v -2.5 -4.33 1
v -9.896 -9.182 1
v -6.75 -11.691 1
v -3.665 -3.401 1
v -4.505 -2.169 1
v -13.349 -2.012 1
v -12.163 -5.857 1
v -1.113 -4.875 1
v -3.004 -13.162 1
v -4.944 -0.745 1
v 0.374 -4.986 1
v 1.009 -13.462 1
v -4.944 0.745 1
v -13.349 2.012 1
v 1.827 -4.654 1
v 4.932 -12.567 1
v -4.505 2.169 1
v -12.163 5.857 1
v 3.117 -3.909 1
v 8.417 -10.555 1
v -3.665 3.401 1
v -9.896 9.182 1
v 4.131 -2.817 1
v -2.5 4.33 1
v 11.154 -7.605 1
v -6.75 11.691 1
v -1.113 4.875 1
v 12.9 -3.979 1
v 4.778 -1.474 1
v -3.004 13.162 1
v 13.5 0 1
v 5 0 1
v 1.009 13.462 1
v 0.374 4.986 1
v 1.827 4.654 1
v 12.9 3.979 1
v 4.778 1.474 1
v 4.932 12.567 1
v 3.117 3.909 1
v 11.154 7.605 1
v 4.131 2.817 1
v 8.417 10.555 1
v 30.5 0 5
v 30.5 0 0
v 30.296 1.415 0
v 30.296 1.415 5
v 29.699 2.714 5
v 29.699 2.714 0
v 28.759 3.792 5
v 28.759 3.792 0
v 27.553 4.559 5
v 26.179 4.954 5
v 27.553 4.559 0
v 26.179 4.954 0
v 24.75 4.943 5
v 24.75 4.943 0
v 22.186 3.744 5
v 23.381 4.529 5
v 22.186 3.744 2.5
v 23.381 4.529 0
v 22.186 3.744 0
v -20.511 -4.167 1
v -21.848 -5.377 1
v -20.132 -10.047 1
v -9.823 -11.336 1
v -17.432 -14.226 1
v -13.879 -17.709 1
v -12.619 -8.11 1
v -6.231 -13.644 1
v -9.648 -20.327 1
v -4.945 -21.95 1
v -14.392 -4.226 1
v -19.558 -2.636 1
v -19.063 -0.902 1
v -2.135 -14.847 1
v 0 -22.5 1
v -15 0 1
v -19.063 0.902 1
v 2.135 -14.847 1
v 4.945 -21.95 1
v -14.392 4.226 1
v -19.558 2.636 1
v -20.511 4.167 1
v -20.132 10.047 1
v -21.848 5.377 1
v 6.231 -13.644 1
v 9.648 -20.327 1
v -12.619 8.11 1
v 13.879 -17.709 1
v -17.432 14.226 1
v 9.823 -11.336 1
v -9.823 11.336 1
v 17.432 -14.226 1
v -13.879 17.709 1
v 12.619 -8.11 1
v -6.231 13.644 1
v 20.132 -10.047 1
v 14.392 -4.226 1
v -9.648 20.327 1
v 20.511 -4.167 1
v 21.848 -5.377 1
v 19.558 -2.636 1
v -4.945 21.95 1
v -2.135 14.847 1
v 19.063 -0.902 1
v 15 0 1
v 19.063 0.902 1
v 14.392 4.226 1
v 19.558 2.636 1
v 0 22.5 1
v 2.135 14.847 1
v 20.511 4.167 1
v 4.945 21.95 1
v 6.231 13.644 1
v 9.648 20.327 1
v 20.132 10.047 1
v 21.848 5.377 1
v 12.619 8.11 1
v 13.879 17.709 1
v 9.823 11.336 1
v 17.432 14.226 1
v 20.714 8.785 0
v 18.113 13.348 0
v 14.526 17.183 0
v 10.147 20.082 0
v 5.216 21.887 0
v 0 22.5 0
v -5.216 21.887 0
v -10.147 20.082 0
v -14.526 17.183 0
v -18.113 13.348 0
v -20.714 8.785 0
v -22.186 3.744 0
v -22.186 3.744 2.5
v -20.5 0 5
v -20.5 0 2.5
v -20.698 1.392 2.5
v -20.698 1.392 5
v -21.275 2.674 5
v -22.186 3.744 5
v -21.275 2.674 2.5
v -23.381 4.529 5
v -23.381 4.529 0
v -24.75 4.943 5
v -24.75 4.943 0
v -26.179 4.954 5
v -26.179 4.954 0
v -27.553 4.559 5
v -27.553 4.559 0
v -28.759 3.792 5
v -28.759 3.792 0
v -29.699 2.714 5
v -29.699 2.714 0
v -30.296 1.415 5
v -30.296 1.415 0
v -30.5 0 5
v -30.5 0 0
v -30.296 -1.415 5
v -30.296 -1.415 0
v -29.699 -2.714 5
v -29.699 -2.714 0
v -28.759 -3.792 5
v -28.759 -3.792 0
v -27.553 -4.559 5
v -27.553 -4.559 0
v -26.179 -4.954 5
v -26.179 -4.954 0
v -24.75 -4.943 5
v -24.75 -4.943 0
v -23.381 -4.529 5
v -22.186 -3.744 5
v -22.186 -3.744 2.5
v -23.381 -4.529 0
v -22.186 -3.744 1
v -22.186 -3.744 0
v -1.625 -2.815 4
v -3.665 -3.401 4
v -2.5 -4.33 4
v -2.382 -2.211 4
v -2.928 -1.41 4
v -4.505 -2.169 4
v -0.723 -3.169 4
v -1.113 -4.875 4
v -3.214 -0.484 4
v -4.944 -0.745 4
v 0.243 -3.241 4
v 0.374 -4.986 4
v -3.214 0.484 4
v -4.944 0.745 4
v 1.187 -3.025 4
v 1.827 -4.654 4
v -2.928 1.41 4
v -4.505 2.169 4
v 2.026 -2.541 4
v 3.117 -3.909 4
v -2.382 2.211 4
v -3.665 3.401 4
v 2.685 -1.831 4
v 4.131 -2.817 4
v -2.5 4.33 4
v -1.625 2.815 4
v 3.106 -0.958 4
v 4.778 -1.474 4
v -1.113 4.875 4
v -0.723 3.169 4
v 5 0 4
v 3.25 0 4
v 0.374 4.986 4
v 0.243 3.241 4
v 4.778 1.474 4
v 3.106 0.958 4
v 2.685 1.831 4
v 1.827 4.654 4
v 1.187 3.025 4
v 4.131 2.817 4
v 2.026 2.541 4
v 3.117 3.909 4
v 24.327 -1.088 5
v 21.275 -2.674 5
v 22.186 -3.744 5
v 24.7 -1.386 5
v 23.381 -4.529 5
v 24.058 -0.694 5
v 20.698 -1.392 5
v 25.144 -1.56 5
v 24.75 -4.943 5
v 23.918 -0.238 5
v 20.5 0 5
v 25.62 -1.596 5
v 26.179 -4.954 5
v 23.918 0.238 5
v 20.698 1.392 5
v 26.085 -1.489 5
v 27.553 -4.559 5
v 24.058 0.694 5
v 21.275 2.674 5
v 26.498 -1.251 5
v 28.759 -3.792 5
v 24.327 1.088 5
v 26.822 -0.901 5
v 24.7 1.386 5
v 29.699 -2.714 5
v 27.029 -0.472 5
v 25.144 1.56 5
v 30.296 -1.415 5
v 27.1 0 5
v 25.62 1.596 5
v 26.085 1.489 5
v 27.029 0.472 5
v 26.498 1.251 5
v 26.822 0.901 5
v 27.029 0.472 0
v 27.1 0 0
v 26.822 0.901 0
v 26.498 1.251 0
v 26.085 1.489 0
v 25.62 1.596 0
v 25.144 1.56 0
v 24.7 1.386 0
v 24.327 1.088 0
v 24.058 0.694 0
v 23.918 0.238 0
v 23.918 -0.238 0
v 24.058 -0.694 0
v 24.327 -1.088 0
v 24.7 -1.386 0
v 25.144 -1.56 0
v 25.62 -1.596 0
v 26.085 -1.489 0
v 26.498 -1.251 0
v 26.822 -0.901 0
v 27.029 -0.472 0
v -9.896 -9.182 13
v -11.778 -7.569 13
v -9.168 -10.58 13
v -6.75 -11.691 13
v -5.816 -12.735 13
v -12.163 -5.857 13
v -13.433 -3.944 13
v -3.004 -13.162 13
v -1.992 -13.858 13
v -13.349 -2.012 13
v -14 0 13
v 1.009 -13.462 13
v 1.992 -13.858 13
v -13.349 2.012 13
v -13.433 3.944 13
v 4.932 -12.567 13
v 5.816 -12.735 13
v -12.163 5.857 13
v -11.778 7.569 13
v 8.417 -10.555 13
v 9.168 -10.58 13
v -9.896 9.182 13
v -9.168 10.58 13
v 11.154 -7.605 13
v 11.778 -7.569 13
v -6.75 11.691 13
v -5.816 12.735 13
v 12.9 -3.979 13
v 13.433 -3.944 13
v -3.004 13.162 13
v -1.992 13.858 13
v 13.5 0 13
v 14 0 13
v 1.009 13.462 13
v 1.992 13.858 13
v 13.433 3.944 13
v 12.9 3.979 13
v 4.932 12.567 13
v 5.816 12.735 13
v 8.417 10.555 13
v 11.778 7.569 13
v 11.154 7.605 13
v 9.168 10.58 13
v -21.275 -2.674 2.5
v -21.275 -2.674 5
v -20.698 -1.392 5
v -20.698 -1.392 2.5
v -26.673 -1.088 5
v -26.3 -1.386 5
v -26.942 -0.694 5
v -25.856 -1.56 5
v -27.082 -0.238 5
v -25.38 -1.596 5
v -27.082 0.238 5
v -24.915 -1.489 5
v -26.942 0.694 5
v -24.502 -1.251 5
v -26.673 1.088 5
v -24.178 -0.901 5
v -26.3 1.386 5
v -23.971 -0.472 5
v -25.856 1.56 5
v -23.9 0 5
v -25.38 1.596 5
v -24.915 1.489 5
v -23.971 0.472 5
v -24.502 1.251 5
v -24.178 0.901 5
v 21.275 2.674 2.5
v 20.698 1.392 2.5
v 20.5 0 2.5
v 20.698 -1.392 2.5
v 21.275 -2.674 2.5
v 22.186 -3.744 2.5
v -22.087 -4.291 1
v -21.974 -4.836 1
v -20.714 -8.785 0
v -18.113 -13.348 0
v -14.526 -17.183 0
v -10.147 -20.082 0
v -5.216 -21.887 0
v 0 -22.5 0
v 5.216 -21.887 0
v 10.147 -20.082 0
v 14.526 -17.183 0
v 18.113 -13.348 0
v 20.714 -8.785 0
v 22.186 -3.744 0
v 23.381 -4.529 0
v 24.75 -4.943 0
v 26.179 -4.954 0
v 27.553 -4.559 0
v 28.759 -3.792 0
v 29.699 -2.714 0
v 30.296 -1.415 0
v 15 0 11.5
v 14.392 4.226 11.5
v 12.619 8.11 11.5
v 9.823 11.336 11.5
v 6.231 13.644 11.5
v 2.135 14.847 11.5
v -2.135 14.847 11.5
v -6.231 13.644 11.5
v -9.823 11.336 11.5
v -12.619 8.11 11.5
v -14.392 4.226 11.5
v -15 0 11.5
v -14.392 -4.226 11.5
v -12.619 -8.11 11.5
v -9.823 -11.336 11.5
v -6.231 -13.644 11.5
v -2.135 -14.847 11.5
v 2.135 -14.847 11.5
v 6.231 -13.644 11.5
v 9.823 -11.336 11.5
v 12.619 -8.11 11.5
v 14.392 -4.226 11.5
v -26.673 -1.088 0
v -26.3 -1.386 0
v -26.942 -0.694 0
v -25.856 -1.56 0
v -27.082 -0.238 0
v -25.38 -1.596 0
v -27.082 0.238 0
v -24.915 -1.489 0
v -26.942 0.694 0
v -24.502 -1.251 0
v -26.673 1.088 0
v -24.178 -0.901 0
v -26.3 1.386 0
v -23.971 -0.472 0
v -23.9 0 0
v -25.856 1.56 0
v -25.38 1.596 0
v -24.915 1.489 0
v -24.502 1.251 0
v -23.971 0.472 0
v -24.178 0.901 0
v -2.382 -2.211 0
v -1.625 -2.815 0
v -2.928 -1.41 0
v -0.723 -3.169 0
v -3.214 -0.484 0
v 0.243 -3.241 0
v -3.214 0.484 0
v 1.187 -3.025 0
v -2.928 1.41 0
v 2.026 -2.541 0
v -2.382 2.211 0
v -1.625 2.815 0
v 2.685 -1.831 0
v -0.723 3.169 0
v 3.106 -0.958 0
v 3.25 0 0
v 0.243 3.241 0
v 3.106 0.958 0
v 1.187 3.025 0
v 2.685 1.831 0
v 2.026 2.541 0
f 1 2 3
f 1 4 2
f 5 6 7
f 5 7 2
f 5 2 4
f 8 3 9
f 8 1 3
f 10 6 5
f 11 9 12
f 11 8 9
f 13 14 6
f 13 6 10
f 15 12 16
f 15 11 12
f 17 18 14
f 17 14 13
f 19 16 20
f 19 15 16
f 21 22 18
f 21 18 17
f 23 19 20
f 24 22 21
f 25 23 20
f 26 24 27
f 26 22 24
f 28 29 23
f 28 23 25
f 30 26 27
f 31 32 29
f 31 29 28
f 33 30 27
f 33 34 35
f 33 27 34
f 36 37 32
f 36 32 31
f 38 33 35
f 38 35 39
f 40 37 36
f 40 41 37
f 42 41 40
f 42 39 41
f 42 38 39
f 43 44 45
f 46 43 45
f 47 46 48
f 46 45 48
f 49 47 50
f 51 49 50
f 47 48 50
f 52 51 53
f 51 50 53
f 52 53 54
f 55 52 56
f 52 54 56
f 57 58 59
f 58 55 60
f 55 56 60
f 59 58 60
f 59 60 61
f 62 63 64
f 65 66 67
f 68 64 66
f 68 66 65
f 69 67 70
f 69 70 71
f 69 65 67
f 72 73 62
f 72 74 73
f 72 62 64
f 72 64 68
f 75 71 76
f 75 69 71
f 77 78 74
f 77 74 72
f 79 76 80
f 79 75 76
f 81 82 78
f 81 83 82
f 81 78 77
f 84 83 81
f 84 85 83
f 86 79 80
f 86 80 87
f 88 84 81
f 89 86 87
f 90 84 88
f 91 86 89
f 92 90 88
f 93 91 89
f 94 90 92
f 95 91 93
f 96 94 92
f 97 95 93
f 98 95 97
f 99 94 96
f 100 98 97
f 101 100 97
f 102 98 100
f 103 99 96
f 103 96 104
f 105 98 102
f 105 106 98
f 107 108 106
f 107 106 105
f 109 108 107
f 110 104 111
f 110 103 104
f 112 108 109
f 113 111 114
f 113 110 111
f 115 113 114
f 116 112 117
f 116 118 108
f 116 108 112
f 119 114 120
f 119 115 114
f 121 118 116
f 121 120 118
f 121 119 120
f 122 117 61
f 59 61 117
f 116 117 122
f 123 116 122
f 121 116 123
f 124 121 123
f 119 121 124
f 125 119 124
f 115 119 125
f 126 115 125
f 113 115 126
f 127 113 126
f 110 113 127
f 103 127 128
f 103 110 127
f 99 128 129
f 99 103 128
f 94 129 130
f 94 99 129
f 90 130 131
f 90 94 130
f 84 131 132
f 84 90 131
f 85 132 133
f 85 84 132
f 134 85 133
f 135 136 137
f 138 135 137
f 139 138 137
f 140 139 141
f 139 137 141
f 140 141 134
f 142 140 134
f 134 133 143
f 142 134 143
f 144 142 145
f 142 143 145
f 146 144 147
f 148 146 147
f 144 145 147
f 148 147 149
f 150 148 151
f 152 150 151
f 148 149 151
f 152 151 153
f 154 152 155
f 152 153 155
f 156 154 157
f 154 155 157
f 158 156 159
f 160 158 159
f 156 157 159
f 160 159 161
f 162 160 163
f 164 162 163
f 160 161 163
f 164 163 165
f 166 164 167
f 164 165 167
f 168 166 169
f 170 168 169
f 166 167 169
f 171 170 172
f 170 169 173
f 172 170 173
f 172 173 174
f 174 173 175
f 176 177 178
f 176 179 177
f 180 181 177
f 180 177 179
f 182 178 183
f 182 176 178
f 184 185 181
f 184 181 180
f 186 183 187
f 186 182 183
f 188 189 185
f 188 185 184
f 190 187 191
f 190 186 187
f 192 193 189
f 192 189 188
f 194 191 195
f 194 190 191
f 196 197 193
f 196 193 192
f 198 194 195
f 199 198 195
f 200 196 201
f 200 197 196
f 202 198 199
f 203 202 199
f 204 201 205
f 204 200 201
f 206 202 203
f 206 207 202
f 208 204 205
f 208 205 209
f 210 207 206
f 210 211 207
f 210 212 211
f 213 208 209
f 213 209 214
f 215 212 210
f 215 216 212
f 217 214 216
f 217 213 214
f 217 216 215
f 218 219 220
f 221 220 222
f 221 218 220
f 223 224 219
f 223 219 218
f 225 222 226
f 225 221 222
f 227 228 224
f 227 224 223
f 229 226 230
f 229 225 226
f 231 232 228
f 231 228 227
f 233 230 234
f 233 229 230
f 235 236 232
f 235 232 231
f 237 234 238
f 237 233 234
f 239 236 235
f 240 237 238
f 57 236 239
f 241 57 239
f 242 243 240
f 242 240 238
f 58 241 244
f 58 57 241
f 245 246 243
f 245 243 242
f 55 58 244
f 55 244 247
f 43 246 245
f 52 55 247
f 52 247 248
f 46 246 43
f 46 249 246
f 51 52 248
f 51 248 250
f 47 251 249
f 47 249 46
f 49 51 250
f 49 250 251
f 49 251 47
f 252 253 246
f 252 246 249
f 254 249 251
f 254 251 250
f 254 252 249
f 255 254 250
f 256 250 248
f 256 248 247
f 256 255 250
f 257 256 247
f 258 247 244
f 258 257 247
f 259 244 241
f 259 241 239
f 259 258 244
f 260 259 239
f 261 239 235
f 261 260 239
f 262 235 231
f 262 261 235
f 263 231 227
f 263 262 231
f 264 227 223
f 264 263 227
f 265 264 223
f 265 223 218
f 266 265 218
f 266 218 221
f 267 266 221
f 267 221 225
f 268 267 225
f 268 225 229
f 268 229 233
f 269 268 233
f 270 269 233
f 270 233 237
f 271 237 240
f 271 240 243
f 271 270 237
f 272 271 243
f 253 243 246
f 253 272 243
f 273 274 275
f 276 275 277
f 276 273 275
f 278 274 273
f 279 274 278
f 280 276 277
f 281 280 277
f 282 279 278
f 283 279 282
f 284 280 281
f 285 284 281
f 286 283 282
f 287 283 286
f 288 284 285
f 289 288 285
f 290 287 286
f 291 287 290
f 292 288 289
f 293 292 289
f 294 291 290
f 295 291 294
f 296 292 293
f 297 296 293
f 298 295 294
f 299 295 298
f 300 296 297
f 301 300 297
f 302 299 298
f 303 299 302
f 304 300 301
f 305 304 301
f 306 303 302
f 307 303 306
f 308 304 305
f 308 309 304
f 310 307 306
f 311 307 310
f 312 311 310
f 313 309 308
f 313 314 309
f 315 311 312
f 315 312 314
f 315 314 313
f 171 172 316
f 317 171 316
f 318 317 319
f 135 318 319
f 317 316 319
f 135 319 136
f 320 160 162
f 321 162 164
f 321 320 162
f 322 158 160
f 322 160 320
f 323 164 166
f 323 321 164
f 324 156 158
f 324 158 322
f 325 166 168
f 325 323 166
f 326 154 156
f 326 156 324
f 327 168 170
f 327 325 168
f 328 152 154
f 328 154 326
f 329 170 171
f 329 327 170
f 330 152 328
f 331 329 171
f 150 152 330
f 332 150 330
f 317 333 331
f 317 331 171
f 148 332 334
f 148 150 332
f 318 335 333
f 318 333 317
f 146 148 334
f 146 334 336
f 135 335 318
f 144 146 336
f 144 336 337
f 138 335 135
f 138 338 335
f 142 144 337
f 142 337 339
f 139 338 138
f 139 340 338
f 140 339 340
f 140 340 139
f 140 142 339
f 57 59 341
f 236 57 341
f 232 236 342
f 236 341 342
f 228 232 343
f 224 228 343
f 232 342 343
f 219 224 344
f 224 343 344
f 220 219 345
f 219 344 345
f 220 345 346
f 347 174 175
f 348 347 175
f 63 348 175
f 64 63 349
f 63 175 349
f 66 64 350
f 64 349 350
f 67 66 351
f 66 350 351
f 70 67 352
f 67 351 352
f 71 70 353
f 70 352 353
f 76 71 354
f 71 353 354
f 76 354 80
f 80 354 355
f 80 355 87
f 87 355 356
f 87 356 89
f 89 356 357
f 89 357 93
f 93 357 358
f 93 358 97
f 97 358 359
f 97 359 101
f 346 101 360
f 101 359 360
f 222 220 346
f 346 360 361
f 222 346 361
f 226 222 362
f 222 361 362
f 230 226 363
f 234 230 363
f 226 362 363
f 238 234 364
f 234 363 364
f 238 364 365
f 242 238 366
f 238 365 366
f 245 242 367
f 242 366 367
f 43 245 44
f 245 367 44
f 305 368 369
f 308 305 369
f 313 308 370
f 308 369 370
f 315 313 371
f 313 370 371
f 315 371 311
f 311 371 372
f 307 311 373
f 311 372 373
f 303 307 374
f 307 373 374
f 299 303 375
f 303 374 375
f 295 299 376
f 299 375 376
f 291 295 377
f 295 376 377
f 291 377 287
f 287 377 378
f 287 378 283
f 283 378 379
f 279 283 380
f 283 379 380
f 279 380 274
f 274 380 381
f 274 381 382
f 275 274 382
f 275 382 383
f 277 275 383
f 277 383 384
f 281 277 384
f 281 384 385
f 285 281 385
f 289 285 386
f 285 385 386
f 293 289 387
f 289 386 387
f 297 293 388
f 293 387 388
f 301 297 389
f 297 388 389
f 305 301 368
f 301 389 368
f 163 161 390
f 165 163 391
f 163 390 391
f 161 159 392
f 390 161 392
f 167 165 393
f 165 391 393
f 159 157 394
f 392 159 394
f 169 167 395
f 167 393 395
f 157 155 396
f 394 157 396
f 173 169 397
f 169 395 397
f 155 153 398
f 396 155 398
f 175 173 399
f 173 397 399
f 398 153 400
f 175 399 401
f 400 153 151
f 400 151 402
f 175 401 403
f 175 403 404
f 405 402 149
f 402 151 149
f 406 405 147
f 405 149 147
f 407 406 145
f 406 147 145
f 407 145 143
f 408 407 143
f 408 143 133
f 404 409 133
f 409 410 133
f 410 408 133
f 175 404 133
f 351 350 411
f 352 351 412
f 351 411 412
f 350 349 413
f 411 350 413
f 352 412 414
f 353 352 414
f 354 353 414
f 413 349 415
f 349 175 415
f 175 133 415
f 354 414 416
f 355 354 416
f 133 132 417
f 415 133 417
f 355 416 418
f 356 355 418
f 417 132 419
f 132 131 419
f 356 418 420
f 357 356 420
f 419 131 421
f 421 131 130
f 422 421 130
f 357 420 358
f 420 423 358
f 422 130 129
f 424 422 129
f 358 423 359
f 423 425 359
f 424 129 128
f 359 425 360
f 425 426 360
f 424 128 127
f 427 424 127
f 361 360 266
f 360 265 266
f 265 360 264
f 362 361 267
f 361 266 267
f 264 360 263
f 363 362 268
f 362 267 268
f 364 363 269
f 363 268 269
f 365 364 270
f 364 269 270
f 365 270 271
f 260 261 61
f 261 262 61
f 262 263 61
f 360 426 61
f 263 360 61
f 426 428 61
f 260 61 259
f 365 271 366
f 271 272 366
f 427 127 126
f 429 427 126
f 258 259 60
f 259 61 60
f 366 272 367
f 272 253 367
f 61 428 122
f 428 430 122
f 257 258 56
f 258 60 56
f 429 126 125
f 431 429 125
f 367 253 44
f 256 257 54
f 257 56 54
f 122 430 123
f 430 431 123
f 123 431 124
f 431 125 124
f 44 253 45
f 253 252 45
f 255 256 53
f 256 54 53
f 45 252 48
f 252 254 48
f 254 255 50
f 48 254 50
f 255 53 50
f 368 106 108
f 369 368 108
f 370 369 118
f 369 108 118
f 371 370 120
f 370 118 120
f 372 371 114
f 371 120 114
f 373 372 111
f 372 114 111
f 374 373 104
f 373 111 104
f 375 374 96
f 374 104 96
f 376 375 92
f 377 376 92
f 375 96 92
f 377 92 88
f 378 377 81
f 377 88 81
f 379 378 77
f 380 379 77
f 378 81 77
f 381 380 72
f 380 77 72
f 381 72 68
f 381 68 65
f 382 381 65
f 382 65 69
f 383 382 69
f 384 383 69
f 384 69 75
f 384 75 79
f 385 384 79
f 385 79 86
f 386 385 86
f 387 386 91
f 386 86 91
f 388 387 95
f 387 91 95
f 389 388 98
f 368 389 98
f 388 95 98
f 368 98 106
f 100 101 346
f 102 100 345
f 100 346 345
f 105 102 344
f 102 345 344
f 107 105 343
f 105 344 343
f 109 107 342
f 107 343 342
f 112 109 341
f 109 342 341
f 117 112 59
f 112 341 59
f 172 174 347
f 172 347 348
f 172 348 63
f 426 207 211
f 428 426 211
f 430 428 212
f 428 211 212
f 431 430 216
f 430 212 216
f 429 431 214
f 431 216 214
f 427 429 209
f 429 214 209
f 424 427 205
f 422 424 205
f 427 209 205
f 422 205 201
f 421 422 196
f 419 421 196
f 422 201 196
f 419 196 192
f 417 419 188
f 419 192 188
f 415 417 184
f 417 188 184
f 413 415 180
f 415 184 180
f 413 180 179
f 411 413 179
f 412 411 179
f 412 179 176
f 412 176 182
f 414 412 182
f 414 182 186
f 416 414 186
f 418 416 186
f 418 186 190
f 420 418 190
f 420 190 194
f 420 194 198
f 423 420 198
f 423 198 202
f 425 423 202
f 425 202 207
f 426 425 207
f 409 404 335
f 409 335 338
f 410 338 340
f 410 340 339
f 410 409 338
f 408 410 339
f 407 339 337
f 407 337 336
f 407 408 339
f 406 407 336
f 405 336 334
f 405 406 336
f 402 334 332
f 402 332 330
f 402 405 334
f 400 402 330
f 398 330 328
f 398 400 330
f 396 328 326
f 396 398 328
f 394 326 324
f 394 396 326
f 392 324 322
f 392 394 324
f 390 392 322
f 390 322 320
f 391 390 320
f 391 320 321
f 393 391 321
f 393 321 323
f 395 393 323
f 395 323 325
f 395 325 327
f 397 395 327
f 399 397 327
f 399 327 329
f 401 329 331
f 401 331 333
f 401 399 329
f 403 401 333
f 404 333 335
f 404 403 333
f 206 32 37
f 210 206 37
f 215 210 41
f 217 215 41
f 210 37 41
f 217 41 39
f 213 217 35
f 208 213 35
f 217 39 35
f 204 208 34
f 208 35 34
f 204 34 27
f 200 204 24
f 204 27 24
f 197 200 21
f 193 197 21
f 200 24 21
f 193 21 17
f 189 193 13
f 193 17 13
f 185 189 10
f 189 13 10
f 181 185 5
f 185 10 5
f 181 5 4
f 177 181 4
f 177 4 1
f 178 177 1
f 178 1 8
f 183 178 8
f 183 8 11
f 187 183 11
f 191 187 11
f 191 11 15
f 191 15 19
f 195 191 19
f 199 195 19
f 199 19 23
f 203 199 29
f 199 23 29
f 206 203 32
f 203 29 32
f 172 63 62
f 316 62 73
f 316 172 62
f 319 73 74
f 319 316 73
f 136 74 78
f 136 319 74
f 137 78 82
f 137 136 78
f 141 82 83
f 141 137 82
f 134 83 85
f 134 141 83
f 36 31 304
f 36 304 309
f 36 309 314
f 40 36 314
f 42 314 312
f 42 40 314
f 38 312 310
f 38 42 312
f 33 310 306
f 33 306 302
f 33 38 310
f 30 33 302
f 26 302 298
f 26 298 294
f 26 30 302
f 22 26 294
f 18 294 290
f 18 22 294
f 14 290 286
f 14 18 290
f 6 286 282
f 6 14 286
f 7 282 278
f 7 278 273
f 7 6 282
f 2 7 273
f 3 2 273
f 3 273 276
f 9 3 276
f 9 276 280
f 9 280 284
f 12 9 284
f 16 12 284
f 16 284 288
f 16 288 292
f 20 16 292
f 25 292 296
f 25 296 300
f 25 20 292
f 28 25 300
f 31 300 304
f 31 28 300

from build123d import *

# Parameters (mm, degrees)
F0_R         = 1.6
F1_DEPTH     = 5
F2_DEPTH     = 1
F3_R         = 15
F3_R_2       = 13.5
F4_DEPTH     = 12
F5_SIZE2     = 1.5
F5_SIZE      = 1
F8_T4_ANGLE  = 185.4300536725
F8_S5_R      = 22.5
F8_T6_DEPTH  = 9
F8_T10_ANGLE = 185.4300536725
F8_S11_R     = 22.5
F8_T12_DEPTH = 9
F9_R         = 5
F10_DEPTH    = 3
F11_R        = 3.25
F12_DEPTH    = 5


# Not quite as in the source:
# - a fillet or chamfer that OpenCascade refuses, or shapes differently, is made with other operations: its cross-section is extruded or revolved along the edge and cut away or added
# - a feature of the source that left no trace in its solid (it failed there, or was rolled back) is left out


with BuildPart() as f1:
    # F0 (on Top) → F1 (new body)
    with BuildSketch(Plane.XY):
        with BuildLine():
            ThreePointArc((-22.1862745098, -3.7442253372), (-22.5, 0), (-22.1862745098, 3.7442253372))
            ThreePointArc((-22.1862745098, 3.7442253372), (-30.5, 0), (-22.1862745098, -3.7442253372))
        make_face()
        with Locations((-25.5, 0)):
            Circle(F0_R, mode=Mode.SUBTRACT)
        with BuildLine():
            ThreePointArc((-20.5, 0), (-20.9410183456, 2.0532136456), (-22.1862745098, 3.7442253372))
            ThreePointArc((-22.1862745098, 3.7442253372), (-22.5, 0), (-22.1862745098, -3.7442253372))
            ThreePointArc((-22.1862745098, -3.7442253372), (-20.9410183456, -2.0532136456), (-20.5, 0))
        make_face()
    extrude(amount=F1_DEPTH)



with BuildPart() as f1b:
    # F0 (on Top) → F1, piece 2 (new body)
    with BuildSketch(Plane.XY):
        with BuildLine():
            ThreePointArc((22.1862745098, 3.7442253372), (22.4214314493, 1.8786728733), (22.5, 0))
            ThreePointArc((22.5, 0), (22.4214314493, -1.8786728733), (22.1862745098, -3.7442253372))
            ThreePointArc((22.1862745098, -3.7442253372), (27.5532136456, -4.5589816544), (30.5, 0))
            ThreePointArc((30.5, 0), (27.5532136456, 4.5589816544), (22.1862745098, 3.7442253372))
        make_face()
        with Locations((25.5, 0)):
            Circle(F0_R, mode=Mode.SUBTRACT)
        with BuildLine():
            ThreePointArc((22.1862745098, -3.7442253372), (22.4214314493, -1.8786728733), (22.5, 0))
            ThreePointArc((22.5, 0), (22.4214314493, 1.8786728733), (22.1862745098, 3.7442253372))
            ThreePointArc((22.1862745098, 3.7442253372), (20.5, 0), (22.1862745098, -3.7442253372))
        make_face()
    extrude(amount=F1_DEPTH)


with BuildPart() as f1_1:
    add(f1.part)

    add(f1b.part)  # F2 merges F1b
    # F0 (on Top) → F2 (join)
    with BuildSketch(Plane.XY):
        with BuildLine():
            ThreePointArc((22.1862745098, -3.7442253372), (20.5, 0), (22.1862745098, 3.7442253372))
            ThreePointArc((22.1862745098, 3.7442253372), (0, 22.5), (-22.1862745098, 3.7442253372))
            ThreePointArc((-22.1862745098, 3.7442253372), (-20.9410183456, 2.0532136456), (-20.5, 0))
            ThreePointArc((-20.5, 0), (-20.9410183456, -2.0532136456), (-22.1862745098, -3.7442253372))
            ThreePointArc((-22.1862745098, -3.7442253372), (0, -22.5), (22.1862745098, -3.7442253372))
        make_face()
    extrude(amount=F2_DEPTH)

    # F3 (on face) → F4 (join)
    with BuildSketch(Plane.XY.offset(1)):
        Circle(F3_R)
        Circle(F3_R_2, mode=Mode.SUBTRACT)
    extrude(amount=F4_DEPTH)

    # F5
    f5_edges = [f1_1.edges().sort_by_distance(p)[0] for p in [
        (-15, 0, 13),
    ]]
    f5_side = f1_1.faces().sort_by_distance((-14.575736, 0, 13))[0]
    chamfer(f5_edges, length=F5_SIZE, length2=F5_SIZE2, reference=f5_side)

    # F8: chamfer of 1.5 on 2 edges, made by hand


with BuildPart() as f8_tool2:
    # F8_s3 → F8_t4 (revolve)
    with BuildSketch(Plane(origin=(25.4427839223, 1.2065389767, 0), x_dir=(0, 0, 1), z_dir=(0.9988774861, 0.0473684257, 0))):
        Polygon((1, 7.7078948555), (2.5, 6.2078948555), (1, 6.2078948555), align=None)
    revolve(axis=Axis((25.5, 0, 1), (0, 0, -1)), revolution_arc=F8_T4_ANGLE)

    # F8_s5 → F8_t6 (intersect, symmetric)
    with BuildSketch(Plane.XY.offset(1.8)):
        Circle(F8_S5_R)
    extrude(amount=F8_T6_DEPTH, both=True, mode=Mode.INTERSECT)


with BuildPart() as f1_2:
    add(f1_1.part)

    # F8_t1: union F8_tool2
    add(f8_tool2.part)


with BuildPart() as f8_tool8:
    # F8_s9 → F8_t10 (revolve)
    with BuildSketch(Plane(origin=(-25.4427839223, 1.2065389767, 0), x_dir=(0, 0, 1), z_dir=(-0.9988774861, 0.0473684257, 0))):
        Polygon((1, -7.7078948555), (2.5, -6.2078948555), (1, -6.2078948555), align=None)
    revolve(axis=Axis((-25.5, 0, 1), (0, 0, 1)), revolution_arc=F8_T10_ANGLE)

    # F8_s11 → F8_t12 (intersect, symmetric)
    with BuildSketch(Plane.XY.offset(1.7)):
        Circle(F8_S11_R)
    extrude(amount=F8_T12_DEPTH, both=True, mode=Mode.INTERSECT)


with BuildPart() as f1_3:
    add(f1_2.part)

    # F8_t7: union F8_tool8
    add(f8_tool8.part)

    # F9 (on face) → F10 (join)
    with BuildSketch(Plane.XY.offset(1)):
        Circle(F9_R)
    extrude(amount=F10_DEPTH)

    # F11 (on face) → F12 (cut)
    with BuildSketch(Plane.XY.offset(4)):
        Circle(F11_R)
    extrude(amount=-F12_DEPTH, mode=Mode.SUBTRACT)


solid = f1_3.part
